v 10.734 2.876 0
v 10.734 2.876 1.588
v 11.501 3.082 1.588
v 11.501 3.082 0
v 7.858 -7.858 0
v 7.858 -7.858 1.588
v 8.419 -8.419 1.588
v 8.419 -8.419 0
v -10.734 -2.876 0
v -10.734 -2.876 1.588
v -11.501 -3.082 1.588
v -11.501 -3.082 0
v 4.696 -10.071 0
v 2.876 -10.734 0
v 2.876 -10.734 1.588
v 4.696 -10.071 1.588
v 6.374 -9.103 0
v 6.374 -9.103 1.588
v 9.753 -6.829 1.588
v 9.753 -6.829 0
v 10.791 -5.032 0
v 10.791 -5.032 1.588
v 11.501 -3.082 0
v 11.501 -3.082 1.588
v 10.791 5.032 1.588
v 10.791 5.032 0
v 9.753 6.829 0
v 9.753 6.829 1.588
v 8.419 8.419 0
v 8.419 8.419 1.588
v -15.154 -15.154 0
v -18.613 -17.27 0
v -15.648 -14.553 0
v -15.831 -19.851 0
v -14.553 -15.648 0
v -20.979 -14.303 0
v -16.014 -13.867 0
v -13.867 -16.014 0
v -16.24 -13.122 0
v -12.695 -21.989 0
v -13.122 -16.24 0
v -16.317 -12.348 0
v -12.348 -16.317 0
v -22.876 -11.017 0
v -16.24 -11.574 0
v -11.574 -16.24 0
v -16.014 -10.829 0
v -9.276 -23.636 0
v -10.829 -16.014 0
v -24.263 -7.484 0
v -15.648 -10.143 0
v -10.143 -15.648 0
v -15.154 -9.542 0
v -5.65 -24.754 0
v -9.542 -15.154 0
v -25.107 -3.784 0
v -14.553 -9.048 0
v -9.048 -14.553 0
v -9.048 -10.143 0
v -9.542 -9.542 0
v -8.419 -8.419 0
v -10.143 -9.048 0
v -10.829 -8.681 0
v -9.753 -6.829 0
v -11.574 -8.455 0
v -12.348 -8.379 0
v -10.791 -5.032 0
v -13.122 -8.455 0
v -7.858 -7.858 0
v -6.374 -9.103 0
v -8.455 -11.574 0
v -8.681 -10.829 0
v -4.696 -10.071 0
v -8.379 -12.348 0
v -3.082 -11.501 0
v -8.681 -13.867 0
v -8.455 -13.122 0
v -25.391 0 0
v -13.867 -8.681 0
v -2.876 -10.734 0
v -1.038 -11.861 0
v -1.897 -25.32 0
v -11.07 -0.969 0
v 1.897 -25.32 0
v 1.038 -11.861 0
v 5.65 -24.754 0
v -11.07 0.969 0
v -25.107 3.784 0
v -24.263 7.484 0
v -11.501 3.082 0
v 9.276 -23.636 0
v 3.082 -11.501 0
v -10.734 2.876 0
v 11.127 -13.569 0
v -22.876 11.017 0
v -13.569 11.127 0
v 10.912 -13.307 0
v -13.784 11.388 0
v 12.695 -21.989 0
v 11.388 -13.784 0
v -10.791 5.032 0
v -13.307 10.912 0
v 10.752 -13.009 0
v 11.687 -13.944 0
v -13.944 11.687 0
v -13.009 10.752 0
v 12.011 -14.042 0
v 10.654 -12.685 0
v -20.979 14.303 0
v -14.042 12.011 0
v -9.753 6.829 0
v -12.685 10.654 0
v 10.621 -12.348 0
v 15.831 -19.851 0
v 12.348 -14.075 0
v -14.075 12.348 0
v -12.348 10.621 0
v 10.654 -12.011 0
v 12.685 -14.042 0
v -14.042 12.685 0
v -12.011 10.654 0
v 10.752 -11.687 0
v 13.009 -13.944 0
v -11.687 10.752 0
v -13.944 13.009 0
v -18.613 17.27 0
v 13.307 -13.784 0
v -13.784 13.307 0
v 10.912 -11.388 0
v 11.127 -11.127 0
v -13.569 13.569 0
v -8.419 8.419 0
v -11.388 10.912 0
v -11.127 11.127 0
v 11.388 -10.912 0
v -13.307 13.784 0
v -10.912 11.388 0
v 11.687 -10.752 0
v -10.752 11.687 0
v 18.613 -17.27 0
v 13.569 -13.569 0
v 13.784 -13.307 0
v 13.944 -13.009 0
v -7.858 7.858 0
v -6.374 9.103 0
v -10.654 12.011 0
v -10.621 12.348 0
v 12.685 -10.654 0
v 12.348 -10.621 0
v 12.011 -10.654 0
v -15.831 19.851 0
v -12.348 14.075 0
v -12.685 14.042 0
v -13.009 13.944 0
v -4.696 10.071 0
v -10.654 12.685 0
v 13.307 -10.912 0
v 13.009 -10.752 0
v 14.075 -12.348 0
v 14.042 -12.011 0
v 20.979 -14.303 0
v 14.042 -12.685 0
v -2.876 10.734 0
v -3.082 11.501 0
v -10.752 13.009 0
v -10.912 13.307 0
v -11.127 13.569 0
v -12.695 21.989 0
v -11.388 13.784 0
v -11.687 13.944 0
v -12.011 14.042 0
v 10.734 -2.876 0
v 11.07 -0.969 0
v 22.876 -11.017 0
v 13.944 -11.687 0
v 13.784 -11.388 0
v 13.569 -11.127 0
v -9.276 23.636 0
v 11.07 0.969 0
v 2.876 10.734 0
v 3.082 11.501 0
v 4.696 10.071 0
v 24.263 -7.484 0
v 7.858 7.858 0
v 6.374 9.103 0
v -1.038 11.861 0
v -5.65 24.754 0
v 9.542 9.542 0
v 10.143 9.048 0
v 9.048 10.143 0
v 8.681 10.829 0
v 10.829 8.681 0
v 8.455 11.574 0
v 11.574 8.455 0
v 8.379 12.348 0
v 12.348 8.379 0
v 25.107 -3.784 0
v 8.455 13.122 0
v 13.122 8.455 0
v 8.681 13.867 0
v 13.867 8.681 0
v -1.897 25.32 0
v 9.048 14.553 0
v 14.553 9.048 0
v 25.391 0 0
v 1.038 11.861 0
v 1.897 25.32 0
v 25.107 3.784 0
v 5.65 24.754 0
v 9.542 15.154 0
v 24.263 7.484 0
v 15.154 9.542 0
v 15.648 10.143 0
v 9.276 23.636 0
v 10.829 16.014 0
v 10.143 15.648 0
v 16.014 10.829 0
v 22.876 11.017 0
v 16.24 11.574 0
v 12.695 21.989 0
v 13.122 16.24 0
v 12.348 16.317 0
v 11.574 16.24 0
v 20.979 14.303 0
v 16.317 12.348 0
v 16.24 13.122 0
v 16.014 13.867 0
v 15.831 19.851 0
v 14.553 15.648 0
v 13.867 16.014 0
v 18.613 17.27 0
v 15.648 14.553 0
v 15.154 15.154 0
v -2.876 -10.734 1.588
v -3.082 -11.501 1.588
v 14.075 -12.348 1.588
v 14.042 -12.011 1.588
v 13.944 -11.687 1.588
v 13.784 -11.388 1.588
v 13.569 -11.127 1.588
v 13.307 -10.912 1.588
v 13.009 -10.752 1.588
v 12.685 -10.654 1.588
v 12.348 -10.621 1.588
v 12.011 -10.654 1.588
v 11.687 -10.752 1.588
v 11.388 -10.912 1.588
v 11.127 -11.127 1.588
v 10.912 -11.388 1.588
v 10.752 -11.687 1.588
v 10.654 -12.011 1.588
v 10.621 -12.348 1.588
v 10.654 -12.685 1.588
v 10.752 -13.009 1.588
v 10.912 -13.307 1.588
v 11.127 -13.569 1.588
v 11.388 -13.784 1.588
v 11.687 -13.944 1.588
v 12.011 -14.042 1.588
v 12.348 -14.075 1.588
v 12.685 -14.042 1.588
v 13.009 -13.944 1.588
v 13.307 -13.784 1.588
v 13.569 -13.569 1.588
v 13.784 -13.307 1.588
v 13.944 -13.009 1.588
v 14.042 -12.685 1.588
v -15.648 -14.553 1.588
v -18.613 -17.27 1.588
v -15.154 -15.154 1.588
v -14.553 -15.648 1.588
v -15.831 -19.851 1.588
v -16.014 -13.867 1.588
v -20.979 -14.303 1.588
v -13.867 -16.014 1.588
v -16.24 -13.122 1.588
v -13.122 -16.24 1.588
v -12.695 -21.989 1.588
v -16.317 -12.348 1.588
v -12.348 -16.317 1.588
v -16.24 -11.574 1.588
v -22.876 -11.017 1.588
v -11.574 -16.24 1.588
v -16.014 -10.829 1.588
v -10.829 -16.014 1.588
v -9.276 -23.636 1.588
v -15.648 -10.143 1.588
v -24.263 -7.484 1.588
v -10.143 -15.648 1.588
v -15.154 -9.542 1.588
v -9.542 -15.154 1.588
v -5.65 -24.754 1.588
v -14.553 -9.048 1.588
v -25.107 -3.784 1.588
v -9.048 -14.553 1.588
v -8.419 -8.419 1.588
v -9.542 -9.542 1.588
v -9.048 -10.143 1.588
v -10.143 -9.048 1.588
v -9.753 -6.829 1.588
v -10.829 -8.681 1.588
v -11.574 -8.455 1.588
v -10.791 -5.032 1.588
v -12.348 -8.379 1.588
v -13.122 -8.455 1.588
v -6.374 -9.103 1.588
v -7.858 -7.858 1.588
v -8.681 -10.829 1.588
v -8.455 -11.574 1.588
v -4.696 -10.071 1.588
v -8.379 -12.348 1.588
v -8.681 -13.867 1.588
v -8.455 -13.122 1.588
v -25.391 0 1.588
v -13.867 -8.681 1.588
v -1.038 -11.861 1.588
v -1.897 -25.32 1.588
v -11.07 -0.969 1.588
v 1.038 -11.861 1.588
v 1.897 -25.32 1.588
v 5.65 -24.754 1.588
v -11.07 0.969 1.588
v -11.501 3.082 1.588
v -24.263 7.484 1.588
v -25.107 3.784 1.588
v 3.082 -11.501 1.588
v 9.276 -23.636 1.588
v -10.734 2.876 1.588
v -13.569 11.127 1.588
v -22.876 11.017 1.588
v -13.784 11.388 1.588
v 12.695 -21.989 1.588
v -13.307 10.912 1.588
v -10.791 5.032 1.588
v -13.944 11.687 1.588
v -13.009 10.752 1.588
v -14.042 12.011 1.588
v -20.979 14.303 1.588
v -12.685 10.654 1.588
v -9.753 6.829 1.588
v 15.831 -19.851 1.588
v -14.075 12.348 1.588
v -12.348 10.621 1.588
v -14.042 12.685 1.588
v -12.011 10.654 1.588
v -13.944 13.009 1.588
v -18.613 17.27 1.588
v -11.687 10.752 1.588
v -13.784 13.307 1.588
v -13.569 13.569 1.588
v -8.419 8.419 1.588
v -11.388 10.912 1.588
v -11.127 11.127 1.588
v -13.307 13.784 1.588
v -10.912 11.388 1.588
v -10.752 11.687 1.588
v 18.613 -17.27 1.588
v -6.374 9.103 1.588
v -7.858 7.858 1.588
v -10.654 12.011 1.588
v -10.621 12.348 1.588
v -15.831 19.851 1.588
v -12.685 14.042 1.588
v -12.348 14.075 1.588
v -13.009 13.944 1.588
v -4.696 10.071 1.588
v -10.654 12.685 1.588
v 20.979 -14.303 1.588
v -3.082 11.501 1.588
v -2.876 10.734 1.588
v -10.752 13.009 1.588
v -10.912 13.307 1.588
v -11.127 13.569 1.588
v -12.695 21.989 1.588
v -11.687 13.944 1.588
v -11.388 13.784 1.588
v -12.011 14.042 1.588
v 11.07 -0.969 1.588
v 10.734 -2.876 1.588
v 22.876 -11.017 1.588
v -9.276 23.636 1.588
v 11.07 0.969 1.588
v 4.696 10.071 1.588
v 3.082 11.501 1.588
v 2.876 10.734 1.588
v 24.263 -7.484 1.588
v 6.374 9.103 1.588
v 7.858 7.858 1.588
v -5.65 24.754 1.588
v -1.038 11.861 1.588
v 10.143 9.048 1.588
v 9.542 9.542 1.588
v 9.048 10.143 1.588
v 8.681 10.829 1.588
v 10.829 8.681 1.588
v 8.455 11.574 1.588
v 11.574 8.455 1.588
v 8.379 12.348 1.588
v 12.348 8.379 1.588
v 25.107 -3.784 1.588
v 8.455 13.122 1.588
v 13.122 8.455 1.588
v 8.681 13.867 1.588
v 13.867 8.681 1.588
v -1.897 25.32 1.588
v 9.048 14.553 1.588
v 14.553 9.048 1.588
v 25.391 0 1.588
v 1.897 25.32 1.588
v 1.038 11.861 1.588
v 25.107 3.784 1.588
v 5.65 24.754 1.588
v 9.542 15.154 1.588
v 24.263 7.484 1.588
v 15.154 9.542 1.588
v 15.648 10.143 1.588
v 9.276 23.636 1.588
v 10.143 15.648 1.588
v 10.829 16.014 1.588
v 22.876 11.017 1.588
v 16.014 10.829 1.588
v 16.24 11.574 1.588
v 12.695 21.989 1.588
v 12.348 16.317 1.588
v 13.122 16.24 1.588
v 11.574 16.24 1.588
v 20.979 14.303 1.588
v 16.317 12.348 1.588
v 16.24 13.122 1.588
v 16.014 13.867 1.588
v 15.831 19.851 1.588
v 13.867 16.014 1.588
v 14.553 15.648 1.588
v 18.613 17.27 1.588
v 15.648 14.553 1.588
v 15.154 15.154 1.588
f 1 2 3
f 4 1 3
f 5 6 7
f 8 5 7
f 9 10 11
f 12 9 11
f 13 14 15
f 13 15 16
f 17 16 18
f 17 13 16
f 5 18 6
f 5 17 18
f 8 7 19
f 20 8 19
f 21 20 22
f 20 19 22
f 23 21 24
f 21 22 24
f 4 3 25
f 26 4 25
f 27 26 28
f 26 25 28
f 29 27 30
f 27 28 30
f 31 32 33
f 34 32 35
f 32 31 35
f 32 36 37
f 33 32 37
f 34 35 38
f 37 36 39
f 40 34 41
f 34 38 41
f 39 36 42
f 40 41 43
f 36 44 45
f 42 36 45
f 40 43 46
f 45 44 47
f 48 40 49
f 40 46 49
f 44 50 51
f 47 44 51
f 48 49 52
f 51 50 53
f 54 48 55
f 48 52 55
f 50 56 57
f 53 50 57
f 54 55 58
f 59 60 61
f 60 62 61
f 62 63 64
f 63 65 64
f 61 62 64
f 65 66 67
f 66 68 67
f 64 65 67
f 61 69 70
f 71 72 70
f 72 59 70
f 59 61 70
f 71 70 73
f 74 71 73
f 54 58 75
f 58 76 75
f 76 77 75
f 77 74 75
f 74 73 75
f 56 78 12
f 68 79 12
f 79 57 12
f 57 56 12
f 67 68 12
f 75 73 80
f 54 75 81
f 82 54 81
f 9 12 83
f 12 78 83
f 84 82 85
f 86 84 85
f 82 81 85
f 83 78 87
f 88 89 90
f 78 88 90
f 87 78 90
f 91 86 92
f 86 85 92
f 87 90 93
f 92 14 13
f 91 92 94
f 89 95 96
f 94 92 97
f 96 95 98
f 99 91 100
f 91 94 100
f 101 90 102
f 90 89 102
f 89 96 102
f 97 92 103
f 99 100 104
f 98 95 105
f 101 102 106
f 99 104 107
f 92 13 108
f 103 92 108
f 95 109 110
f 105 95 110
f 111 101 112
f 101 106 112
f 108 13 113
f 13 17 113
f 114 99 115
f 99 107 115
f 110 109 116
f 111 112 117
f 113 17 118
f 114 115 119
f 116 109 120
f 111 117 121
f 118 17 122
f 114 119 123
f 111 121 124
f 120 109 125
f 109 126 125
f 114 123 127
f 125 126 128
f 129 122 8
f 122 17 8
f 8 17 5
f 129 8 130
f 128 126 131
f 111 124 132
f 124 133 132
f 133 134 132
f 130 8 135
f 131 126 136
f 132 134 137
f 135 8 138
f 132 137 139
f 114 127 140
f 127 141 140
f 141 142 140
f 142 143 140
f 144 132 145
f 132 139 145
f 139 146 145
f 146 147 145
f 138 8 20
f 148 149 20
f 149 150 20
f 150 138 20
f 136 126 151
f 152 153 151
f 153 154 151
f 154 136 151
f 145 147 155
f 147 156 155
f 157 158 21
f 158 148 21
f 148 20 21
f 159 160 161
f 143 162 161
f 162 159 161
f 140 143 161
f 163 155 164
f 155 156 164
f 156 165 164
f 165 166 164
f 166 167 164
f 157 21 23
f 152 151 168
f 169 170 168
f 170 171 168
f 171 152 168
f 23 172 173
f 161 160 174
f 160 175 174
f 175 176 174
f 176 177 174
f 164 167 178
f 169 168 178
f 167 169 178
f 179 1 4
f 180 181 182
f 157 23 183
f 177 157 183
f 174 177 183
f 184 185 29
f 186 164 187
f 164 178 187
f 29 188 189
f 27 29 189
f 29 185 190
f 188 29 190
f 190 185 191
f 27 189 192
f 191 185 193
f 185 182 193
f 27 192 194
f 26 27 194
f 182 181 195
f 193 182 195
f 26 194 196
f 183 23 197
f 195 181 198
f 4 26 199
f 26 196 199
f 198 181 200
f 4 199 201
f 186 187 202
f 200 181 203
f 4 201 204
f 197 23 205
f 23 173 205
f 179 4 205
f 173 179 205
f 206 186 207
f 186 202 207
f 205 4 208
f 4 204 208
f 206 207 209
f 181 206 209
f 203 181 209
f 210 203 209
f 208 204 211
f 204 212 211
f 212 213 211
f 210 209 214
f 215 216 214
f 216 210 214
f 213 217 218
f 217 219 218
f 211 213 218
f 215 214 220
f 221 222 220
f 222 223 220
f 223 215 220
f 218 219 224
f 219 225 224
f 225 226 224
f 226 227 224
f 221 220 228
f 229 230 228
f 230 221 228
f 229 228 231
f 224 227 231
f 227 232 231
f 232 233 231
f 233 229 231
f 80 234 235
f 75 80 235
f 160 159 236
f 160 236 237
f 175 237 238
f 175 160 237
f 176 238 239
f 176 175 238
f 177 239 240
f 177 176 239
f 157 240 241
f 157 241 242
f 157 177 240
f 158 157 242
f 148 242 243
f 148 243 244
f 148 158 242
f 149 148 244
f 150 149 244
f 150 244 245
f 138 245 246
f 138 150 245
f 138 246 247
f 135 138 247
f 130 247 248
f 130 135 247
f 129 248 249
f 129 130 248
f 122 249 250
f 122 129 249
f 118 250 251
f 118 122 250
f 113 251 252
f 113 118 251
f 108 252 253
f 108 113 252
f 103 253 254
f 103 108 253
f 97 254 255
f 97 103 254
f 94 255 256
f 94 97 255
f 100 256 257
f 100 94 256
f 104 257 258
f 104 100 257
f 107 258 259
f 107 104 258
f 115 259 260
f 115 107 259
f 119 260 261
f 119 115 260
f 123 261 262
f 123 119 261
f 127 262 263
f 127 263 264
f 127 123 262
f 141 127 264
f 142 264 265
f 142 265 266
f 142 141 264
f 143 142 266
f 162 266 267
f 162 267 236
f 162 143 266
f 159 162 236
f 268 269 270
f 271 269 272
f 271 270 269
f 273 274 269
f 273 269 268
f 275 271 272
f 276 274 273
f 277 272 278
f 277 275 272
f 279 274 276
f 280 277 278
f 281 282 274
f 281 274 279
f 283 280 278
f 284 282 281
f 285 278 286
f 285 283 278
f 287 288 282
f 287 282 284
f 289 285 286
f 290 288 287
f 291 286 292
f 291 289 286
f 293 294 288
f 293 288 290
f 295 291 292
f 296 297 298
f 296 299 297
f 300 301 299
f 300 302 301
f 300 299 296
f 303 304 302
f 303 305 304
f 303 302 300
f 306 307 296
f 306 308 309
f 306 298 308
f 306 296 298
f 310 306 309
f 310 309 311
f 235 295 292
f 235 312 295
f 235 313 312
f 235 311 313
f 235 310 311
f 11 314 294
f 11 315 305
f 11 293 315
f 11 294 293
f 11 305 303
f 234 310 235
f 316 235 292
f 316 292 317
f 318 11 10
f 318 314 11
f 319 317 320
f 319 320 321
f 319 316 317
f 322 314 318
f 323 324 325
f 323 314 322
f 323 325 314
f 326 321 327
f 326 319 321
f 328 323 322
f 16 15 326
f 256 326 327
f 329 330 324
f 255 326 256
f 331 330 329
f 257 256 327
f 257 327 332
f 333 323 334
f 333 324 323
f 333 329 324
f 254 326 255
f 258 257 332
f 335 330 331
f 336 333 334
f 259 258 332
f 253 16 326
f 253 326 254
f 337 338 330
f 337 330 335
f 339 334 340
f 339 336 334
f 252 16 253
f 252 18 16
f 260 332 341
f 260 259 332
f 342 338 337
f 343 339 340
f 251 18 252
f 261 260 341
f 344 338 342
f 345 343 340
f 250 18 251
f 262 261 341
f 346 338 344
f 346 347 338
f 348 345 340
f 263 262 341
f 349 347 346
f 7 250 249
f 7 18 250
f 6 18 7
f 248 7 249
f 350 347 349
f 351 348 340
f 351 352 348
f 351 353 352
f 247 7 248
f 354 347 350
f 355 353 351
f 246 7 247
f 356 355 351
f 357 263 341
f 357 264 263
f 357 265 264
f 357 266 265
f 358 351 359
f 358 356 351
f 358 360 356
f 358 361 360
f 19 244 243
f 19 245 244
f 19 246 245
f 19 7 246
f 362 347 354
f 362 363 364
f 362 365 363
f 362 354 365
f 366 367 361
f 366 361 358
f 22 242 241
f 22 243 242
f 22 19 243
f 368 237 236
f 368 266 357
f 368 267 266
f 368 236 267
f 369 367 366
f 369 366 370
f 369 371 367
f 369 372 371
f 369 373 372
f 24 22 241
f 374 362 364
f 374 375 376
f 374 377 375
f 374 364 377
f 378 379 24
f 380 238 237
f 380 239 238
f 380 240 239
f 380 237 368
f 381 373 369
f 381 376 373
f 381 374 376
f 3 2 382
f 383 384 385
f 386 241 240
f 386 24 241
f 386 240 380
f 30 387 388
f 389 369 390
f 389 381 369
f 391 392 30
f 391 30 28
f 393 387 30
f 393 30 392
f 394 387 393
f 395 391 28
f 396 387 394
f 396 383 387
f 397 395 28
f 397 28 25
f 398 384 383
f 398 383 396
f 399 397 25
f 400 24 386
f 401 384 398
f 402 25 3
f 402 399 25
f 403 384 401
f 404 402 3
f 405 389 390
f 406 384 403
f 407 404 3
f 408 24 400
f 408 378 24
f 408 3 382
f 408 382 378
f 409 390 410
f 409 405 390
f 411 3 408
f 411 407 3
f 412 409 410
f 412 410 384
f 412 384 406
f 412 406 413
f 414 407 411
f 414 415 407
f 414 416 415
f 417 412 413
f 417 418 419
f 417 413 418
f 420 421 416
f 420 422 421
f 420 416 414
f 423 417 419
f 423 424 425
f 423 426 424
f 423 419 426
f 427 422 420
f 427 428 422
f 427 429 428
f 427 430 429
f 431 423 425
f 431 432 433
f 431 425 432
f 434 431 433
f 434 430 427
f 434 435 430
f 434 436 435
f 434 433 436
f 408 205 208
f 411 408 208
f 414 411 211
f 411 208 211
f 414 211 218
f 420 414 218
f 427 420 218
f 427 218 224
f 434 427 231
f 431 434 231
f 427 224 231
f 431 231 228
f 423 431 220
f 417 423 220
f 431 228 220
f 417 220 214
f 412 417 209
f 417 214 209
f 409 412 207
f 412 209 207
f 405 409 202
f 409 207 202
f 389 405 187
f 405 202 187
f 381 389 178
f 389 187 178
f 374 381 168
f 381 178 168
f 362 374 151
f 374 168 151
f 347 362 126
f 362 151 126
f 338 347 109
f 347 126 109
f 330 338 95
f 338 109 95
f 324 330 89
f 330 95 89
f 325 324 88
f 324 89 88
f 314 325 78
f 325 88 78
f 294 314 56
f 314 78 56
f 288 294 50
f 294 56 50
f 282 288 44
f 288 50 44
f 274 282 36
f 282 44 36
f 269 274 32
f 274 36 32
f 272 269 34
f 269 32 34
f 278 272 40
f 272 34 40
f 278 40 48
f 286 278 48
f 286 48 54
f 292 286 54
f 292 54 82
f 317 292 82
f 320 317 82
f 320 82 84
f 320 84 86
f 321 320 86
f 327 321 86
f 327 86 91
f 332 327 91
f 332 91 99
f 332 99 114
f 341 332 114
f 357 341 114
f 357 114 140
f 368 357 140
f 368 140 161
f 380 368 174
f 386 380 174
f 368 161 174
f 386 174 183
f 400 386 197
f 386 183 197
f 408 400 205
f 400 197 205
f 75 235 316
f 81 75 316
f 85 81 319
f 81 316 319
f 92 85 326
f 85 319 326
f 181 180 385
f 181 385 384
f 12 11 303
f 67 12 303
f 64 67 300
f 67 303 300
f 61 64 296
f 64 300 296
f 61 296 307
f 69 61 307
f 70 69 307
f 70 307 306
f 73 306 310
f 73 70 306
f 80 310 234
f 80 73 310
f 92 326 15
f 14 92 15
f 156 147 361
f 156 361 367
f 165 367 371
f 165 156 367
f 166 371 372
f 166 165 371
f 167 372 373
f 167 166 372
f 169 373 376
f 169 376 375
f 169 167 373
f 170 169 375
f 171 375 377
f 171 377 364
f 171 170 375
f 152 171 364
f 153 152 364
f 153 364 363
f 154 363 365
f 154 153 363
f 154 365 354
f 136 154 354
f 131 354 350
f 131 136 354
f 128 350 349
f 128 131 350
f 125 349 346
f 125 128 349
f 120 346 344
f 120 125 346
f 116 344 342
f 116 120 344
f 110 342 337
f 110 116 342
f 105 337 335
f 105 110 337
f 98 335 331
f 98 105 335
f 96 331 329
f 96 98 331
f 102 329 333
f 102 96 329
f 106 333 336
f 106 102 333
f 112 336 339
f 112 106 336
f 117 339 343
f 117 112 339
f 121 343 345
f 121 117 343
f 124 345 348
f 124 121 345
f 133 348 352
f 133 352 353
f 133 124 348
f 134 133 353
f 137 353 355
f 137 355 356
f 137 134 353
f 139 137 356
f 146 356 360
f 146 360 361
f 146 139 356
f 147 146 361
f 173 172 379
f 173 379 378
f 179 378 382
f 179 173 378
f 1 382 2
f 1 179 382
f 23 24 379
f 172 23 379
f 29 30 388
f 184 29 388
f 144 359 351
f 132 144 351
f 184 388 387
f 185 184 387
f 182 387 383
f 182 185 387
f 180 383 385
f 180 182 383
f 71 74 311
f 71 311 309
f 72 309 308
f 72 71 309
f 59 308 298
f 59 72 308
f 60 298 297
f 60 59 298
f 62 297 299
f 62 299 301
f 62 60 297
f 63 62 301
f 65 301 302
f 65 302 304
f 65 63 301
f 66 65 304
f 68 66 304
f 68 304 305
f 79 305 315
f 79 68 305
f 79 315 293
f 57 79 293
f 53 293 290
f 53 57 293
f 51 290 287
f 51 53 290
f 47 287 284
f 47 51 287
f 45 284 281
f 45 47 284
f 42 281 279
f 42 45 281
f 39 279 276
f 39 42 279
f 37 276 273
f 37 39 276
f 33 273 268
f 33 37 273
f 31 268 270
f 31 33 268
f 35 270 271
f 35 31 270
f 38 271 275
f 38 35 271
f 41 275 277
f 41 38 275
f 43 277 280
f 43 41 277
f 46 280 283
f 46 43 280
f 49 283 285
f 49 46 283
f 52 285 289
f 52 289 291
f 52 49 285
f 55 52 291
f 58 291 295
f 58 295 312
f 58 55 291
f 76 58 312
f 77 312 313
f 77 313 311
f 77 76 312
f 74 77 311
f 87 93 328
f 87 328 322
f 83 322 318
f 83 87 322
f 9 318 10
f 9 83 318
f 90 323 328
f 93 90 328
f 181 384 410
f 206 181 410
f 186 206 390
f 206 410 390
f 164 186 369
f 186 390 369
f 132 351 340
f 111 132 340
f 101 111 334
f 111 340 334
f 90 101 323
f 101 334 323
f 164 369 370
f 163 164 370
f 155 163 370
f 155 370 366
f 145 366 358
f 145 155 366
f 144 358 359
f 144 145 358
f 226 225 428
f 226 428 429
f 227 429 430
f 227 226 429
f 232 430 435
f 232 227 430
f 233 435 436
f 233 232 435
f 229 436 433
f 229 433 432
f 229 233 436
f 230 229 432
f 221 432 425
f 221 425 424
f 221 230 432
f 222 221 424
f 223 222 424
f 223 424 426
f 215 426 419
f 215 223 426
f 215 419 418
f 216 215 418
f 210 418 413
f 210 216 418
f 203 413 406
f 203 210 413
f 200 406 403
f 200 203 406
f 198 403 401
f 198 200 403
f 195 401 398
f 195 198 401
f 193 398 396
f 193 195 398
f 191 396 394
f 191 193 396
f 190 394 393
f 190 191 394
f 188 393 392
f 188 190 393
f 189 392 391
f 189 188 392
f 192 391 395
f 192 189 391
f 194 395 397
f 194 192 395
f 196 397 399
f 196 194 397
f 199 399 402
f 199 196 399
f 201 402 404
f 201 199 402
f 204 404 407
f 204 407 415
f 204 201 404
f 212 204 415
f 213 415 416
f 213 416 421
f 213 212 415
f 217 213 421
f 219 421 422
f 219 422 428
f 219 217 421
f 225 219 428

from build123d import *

# Parameters (mm, degrees)
F0_R     = 25.3907018743
F0_R_2   = 3.96875
F0_R_3   = 1.7272
F0_R_4   = 11.1125
F1_DEPTH = 1.5875
F3_DEPTH = 1.5875
F4_COUNT = 6
F4_ANGLE = 300


with BuildPart() as f1:
    # F0 (on Top) → F1 (new body)
    with BuildSketch(Plane.XY):
        Circle(F0_R)
        with Locations((-12.3478521665, -12.3478521665)):
            Circle(F0_R_2, mode=Mode.SUBTRACT)
        with Locations((12.3478521665, -12.3478521665)):
            Circle(F0_R_3, mode=Mode.SUBTRACT)
        with Locations((-12.3478521665, 12.3478521665)):
            Circle(F0_R_3, mode=Mode.SUBTRACT)
        Circle(F0_R_4, mode=Mode.SUBTRACT)
        with Locations((12.3478521665, 12.3478521665)):
            Circle(F0_R_2, mode=Mode.SUBTRACT)
    extrude(amount=F1_DEPTH)

    # F2 (on face) → F3 (cut, through all)
    with BuildSketch(Plane.XY.offset(1.5875)):
        with BuildLine():
            ThreePointArc((-2.8761266387, 10.7338507446), (0, 11.1125), (2.8761266387, 10.7338507446))
            Line((2.8761266387, 10.7338507446), (3.0815642558, 11.5005543693))
            ThreePointArc((3.0815642558, 11.5005543693), (0, 11.90625), (-3.0815642558, 11.5005543693))
            Line((-3.0815642558, 11.5005543693), (-2.8761266387, 10.7338507446))
        make_face()
    f3 = extrude(amount=-F3_DEPTH, mode=Mode.SUBTRACT)

    # F4: F3 ×6 about axis
    f4_axis = Axis((0, 0, 0), (0, 0, -1))
    for i in range(1, F4_COUNT):
        add(f3.rotate(f4_axis, i * F4_ANGLE / (F4_COUNT - 1)), mode=Mode.SUBTRACT)


solid = f1.part
